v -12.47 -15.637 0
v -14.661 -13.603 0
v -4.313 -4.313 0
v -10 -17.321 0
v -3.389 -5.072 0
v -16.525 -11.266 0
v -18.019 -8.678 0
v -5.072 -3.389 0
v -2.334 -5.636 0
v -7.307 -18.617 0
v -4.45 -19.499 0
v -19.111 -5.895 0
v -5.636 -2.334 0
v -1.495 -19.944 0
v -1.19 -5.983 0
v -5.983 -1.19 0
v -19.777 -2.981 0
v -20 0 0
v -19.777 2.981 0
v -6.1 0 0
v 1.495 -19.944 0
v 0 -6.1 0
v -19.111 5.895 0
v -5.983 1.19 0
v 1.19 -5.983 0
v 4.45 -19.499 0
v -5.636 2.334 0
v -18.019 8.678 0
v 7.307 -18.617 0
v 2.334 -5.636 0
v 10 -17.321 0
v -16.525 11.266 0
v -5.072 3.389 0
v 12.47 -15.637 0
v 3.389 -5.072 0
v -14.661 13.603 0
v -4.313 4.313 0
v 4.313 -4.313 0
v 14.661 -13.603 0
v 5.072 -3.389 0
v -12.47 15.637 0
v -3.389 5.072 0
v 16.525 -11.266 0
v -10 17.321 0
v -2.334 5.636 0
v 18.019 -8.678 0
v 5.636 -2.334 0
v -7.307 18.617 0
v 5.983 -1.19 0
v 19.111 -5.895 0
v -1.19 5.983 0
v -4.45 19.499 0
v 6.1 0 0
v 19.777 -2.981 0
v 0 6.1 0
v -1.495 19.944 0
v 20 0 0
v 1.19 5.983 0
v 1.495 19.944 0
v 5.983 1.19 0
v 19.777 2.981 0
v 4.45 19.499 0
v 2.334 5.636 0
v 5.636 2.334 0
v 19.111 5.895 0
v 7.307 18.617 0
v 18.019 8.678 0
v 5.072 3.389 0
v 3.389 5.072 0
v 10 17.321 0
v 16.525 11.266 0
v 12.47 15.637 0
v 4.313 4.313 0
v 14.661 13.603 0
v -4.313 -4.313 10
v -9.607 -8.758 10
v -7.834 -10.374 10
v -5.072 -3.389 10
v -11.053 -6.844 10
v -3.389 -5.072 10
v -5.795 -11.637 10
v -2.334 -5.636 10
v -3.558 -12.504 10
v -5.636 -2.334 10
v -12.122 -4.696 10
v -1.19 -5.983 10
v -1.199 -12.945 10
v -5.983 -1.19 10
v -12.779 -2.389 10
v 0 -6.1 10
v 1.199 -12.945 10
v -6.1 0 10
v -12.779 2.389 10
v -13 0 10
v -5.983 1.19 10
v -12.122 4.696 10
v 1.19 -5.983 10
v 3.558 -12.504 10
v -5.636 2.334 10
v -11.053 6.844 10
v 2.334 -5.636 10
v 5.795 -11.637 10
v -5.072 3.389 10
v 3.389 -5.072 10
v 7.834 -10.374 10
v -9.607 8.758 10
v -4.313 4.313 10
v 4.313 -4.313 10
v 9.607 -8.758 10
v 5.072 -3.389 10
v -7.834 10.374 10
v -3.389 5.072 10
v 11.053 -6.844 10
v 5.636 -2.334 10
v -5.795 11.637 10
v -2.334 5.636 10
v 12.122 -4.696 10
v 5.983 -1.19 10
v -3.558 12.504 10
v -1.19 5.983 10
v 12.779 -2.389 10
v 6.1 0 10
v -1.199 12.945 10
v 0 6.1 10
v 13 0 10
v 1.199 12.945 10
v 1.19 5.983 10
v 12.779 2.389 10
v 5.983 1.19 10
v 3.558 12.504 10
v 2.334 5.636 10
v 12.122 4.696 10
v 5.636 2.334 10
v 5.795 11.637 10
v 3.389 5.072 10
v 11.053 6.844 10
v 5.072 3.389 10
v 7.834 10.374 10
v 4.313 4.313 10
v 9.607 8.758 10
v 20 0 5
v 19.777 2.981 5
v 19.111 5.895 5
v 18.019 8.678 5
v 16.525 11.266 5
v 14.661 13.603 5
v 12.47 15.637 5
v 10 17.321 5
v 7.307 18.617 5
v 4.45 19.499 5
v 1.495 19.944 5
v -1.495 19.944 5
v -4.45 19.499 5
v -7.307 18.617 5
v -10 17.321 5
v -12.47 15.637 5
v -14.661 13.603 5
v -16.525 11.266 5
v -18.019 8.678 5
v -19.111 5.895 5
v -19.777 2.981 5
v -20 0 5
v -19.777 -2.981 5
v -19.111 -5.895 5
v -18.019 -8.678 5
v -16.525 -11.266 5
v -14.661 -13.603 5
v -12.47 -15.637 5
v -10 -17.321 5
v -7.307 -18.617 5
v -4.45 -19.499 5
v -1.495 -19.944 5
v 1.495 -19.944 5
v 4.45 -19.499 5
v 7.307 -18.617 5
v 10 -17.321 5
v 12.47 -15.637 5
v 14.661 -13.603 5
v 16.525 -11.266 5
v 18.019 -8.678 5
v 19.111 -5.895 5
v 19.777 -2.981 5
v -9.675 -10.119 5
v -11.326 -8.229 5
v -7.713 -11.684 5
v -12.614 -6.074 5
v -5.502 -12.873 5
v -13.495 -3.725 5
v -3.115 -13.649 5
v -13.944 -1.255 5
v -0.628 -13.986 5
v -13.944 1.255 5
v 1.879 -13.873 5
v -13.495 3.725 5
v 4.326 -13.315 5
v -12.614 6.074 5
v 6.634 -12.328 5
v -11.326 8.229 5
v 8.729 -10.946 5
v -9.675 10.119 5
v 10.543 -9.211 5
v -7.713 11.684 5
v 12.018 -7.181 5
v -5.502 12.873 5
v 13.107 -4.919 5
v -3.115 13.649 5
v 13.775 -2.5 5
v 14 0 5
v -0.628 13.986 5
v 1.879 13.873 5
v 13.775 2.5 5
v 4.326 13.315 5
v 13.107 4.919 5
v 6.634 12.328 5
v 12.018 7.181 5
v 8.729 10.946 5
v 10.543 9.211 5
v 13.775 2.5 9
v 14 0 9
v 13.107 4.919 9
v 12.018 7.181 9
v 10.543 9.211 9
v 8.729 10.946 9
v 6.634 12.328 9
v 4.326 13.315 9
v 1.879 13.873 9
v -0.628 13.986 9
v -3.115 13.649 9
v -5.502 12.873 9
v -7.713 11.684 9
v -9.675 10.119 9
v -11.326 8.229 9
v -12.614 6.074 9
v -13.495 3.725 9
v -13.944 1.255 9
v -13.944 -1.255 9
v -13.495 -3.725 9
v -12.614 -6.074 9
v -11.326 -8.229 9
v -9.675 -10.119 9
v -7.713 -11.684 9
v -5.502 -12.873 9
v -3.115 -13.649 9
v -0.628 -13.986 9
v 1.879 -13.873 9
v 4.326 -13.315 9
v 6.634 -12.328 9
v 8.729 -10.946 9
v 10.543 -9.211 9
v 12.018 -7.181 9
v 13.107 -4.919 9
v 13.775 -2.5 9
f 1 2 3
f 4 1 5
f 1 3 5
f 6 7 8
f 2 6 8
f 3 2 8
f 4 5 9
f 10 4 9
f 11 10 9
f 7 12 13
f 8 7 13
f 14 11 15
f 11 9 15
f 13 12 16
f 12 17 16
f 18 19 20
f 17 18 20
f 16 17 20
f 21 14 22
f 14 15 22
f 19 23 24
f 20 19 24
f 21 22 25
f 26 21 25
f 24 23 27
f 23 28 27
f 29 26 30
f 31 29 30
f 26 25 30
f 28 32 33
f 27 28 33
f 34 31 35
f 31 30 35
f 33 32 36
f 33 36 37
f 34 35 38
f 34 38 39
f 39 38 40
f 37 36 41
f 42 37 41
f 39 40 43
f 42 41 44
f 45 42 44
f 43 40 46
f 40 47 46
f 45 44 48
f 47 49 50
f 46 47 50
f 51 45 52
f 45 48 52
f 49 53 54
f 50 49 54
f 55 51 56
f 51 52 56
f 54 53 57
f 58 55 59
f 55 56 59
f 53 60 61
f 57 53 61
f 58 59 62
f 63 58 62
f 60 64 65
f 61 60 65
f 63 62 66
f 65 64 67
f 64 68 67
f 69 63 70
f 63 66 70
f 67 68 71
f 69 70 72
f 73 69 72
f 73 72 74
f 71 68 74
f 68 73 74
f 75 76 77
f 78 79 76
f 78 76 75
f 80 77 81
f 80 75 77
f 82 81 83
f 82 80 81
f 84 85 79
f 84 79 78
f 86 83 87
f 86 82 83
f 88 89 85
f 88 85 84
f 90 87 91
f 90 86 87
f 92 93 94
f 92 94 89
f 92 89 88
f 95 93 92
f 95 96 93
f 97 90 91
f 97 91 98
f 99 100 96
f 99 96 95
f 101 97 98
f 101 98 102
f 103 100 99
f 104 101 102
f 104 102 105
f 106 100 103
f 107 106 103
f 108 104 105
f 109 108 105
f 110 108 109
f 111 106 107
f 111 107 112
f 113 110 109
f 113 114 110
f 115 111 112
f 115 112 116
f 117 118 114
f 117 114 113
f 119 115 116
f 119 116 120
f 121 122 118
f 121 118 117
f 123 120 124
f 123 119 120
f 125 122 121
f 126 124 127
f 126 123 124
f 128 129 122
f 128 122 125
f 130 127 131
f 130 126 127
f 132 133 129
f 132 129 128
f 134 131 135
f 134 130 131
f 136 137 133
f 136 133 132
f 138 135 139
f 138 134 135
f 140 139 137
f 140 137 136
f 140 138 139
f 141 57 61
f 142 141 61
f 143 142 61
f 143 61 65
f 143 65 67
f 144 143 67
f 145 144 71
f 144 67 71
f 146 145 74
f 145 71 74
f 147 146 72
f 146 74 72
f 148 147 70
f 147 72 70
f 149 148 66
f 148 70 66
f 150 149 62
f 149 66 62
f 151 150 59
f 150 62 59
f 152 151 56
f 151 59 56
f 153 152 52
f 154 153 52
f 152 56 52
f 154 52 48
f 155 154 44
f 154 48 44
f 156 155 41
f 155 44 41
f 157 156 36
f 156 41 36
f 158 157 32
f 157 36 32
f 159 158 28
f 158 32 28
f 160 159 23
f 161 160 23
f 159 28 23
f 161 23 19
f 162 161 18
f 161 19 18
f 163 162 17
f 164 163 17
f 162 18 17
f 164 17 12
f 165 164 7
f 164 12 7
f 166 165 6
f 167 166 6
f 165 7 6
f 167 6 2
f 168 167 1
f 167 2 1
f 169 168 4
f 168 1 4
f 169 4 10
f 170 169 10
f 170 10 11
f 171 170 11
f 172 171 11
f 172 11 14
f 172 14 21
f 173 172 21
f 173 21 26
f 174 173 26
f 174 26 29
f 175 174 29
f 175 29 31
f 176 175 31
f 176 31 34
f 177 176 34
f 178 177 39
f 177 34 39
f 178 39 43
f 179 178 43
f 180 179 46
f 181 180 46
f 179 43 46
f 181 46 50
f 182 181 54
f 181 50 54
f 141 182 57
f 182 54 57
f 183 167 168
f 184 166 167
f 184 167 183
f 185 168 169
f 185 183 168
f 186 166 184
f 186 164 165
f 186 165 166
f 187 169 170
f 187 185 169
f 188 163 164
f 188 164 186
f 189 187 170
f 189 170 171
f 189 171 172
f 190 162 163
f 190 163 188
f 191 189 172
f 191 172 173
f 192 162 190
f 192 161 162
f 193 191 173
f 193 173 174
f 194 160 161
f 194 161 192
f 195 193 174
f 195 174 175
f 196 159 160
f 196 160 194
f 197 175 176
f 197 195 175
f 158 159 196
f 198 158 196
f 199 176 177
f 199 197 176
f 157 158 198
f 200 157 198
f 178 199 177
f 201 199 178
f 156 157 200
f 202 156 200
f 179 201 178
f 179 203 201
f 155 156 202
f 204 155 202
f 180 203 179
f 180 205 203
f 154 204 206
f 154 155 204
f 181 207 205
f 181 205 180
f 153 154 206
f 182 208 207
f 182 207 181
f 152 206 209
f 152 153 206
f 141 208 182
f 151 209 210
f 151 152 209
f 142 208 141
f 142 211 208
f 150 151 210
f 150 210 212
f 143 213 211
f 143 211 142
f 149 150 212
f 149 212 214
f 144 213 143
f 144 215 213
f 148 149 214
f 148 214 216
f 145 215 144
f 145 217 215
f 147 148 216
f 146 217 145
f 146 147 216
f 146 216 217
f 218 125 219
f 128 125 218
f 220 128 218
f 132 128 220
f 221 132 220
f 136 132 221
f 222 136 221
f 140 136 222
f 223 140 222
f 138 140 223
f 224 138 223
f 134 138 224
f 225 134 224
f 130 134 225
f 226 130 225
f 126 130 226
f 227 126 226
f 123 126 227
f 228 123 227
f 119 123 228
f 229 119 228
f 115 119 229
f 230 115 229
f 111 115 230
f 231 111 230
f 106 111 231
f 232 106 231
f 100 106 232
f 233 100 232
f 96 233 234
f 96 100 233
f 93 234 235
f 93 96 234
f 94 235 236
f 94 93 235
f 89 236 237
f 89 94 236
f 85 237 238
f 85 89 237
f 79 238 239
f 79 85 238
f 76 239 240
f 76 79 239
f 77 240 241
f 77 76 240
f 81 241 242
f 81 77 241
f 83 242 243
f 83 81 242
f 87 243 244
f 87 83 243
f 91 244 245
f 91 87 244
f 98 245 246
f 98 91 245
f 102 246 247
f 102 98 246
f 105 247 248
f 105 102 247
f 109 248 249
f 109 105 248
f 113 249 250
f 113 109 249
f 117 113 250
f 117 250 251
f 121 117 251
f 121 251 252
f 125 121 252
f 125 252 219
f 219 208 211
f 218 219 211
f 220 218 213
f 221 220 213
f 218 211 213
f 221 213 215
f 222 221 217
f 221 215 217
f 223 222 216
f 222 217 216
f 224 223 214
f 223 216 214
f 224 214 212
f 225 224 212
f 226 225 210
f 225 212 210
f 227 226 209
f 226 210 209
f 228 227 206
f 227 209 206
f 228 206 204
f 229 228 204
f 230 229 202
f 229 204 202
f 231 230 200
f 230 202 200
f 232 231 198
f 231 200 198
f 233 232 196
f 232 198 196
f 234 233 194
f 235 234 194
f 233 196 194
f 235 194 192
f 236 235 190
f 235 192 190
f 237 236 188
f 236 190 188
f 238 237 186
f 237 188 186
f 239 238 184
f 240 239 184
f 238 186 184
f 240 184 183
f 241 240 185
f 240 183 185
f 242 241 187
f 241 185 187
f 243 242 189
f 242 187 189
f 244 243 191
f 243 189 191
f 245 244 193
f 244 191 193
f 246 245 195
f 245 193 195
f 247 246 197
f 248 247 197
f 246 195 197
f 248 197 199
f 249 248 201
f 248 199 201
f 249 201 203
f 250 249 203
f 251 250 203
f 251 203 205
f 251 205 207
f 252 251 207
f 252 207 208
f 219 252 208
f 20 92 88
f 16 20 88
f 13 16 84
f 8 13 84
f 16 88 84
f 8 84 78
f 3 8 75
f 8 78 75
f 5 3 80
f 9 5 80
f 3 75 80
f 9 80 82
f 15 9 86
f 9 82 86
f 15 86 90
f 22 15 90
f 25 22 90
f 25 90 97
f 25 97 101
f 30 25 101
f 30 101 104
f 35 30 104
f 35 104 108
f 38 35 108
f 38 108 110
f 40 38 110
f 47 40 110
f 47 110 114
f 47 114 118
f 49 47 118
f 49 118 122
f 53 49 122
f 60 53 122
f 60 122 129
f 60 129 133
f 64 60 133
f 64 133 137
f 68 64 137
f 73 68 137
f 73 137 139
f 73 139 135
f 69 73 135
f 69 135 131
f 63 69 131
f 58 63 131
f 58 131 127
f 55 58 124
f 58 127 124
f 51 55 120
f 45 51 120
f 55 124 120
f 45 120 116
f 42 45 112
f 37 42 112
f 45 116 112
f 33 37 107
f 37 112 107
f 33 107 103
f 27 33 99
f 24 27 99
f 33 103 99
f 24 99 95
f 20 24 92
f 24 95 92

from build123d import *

# Parameters (mm, degrees)
F0_R     = 20
F1_DEPTH = 5
F2_R     = 14
F3_DEPTH = 5
F5_D     = 12.2
F6_SIZE  = 1


with BuildPart() as f1:
    # F0 (on Top) → F1 (new body)
    with BuildSketch(Plane.XY):
        Circle(F0_R)
    extrude(amount=F1_DEPTH)

    # F2 (on face) → F3 (join)
    with BuildSketch(Plane.XY.offset(5)):
        Circle(F2_R)
    extrude(amount=F3_DEPTH)

    # F5 (through all)
    with Locations(Plane(origin=(0, 0, 0), x_dir=(1, 0, 0), z_dir=(0, 0, -1))):
        with Locations((0, 0)):
            Hole(F5_D / 2)

    # F6
    f6_edges = [f1.edges().sort_by_distance(p)[0] for p in [
        (-14, 0, 10),
    ]]
    chamfer(f6_edges, length=F6_SIZE)


solid = f1.part
